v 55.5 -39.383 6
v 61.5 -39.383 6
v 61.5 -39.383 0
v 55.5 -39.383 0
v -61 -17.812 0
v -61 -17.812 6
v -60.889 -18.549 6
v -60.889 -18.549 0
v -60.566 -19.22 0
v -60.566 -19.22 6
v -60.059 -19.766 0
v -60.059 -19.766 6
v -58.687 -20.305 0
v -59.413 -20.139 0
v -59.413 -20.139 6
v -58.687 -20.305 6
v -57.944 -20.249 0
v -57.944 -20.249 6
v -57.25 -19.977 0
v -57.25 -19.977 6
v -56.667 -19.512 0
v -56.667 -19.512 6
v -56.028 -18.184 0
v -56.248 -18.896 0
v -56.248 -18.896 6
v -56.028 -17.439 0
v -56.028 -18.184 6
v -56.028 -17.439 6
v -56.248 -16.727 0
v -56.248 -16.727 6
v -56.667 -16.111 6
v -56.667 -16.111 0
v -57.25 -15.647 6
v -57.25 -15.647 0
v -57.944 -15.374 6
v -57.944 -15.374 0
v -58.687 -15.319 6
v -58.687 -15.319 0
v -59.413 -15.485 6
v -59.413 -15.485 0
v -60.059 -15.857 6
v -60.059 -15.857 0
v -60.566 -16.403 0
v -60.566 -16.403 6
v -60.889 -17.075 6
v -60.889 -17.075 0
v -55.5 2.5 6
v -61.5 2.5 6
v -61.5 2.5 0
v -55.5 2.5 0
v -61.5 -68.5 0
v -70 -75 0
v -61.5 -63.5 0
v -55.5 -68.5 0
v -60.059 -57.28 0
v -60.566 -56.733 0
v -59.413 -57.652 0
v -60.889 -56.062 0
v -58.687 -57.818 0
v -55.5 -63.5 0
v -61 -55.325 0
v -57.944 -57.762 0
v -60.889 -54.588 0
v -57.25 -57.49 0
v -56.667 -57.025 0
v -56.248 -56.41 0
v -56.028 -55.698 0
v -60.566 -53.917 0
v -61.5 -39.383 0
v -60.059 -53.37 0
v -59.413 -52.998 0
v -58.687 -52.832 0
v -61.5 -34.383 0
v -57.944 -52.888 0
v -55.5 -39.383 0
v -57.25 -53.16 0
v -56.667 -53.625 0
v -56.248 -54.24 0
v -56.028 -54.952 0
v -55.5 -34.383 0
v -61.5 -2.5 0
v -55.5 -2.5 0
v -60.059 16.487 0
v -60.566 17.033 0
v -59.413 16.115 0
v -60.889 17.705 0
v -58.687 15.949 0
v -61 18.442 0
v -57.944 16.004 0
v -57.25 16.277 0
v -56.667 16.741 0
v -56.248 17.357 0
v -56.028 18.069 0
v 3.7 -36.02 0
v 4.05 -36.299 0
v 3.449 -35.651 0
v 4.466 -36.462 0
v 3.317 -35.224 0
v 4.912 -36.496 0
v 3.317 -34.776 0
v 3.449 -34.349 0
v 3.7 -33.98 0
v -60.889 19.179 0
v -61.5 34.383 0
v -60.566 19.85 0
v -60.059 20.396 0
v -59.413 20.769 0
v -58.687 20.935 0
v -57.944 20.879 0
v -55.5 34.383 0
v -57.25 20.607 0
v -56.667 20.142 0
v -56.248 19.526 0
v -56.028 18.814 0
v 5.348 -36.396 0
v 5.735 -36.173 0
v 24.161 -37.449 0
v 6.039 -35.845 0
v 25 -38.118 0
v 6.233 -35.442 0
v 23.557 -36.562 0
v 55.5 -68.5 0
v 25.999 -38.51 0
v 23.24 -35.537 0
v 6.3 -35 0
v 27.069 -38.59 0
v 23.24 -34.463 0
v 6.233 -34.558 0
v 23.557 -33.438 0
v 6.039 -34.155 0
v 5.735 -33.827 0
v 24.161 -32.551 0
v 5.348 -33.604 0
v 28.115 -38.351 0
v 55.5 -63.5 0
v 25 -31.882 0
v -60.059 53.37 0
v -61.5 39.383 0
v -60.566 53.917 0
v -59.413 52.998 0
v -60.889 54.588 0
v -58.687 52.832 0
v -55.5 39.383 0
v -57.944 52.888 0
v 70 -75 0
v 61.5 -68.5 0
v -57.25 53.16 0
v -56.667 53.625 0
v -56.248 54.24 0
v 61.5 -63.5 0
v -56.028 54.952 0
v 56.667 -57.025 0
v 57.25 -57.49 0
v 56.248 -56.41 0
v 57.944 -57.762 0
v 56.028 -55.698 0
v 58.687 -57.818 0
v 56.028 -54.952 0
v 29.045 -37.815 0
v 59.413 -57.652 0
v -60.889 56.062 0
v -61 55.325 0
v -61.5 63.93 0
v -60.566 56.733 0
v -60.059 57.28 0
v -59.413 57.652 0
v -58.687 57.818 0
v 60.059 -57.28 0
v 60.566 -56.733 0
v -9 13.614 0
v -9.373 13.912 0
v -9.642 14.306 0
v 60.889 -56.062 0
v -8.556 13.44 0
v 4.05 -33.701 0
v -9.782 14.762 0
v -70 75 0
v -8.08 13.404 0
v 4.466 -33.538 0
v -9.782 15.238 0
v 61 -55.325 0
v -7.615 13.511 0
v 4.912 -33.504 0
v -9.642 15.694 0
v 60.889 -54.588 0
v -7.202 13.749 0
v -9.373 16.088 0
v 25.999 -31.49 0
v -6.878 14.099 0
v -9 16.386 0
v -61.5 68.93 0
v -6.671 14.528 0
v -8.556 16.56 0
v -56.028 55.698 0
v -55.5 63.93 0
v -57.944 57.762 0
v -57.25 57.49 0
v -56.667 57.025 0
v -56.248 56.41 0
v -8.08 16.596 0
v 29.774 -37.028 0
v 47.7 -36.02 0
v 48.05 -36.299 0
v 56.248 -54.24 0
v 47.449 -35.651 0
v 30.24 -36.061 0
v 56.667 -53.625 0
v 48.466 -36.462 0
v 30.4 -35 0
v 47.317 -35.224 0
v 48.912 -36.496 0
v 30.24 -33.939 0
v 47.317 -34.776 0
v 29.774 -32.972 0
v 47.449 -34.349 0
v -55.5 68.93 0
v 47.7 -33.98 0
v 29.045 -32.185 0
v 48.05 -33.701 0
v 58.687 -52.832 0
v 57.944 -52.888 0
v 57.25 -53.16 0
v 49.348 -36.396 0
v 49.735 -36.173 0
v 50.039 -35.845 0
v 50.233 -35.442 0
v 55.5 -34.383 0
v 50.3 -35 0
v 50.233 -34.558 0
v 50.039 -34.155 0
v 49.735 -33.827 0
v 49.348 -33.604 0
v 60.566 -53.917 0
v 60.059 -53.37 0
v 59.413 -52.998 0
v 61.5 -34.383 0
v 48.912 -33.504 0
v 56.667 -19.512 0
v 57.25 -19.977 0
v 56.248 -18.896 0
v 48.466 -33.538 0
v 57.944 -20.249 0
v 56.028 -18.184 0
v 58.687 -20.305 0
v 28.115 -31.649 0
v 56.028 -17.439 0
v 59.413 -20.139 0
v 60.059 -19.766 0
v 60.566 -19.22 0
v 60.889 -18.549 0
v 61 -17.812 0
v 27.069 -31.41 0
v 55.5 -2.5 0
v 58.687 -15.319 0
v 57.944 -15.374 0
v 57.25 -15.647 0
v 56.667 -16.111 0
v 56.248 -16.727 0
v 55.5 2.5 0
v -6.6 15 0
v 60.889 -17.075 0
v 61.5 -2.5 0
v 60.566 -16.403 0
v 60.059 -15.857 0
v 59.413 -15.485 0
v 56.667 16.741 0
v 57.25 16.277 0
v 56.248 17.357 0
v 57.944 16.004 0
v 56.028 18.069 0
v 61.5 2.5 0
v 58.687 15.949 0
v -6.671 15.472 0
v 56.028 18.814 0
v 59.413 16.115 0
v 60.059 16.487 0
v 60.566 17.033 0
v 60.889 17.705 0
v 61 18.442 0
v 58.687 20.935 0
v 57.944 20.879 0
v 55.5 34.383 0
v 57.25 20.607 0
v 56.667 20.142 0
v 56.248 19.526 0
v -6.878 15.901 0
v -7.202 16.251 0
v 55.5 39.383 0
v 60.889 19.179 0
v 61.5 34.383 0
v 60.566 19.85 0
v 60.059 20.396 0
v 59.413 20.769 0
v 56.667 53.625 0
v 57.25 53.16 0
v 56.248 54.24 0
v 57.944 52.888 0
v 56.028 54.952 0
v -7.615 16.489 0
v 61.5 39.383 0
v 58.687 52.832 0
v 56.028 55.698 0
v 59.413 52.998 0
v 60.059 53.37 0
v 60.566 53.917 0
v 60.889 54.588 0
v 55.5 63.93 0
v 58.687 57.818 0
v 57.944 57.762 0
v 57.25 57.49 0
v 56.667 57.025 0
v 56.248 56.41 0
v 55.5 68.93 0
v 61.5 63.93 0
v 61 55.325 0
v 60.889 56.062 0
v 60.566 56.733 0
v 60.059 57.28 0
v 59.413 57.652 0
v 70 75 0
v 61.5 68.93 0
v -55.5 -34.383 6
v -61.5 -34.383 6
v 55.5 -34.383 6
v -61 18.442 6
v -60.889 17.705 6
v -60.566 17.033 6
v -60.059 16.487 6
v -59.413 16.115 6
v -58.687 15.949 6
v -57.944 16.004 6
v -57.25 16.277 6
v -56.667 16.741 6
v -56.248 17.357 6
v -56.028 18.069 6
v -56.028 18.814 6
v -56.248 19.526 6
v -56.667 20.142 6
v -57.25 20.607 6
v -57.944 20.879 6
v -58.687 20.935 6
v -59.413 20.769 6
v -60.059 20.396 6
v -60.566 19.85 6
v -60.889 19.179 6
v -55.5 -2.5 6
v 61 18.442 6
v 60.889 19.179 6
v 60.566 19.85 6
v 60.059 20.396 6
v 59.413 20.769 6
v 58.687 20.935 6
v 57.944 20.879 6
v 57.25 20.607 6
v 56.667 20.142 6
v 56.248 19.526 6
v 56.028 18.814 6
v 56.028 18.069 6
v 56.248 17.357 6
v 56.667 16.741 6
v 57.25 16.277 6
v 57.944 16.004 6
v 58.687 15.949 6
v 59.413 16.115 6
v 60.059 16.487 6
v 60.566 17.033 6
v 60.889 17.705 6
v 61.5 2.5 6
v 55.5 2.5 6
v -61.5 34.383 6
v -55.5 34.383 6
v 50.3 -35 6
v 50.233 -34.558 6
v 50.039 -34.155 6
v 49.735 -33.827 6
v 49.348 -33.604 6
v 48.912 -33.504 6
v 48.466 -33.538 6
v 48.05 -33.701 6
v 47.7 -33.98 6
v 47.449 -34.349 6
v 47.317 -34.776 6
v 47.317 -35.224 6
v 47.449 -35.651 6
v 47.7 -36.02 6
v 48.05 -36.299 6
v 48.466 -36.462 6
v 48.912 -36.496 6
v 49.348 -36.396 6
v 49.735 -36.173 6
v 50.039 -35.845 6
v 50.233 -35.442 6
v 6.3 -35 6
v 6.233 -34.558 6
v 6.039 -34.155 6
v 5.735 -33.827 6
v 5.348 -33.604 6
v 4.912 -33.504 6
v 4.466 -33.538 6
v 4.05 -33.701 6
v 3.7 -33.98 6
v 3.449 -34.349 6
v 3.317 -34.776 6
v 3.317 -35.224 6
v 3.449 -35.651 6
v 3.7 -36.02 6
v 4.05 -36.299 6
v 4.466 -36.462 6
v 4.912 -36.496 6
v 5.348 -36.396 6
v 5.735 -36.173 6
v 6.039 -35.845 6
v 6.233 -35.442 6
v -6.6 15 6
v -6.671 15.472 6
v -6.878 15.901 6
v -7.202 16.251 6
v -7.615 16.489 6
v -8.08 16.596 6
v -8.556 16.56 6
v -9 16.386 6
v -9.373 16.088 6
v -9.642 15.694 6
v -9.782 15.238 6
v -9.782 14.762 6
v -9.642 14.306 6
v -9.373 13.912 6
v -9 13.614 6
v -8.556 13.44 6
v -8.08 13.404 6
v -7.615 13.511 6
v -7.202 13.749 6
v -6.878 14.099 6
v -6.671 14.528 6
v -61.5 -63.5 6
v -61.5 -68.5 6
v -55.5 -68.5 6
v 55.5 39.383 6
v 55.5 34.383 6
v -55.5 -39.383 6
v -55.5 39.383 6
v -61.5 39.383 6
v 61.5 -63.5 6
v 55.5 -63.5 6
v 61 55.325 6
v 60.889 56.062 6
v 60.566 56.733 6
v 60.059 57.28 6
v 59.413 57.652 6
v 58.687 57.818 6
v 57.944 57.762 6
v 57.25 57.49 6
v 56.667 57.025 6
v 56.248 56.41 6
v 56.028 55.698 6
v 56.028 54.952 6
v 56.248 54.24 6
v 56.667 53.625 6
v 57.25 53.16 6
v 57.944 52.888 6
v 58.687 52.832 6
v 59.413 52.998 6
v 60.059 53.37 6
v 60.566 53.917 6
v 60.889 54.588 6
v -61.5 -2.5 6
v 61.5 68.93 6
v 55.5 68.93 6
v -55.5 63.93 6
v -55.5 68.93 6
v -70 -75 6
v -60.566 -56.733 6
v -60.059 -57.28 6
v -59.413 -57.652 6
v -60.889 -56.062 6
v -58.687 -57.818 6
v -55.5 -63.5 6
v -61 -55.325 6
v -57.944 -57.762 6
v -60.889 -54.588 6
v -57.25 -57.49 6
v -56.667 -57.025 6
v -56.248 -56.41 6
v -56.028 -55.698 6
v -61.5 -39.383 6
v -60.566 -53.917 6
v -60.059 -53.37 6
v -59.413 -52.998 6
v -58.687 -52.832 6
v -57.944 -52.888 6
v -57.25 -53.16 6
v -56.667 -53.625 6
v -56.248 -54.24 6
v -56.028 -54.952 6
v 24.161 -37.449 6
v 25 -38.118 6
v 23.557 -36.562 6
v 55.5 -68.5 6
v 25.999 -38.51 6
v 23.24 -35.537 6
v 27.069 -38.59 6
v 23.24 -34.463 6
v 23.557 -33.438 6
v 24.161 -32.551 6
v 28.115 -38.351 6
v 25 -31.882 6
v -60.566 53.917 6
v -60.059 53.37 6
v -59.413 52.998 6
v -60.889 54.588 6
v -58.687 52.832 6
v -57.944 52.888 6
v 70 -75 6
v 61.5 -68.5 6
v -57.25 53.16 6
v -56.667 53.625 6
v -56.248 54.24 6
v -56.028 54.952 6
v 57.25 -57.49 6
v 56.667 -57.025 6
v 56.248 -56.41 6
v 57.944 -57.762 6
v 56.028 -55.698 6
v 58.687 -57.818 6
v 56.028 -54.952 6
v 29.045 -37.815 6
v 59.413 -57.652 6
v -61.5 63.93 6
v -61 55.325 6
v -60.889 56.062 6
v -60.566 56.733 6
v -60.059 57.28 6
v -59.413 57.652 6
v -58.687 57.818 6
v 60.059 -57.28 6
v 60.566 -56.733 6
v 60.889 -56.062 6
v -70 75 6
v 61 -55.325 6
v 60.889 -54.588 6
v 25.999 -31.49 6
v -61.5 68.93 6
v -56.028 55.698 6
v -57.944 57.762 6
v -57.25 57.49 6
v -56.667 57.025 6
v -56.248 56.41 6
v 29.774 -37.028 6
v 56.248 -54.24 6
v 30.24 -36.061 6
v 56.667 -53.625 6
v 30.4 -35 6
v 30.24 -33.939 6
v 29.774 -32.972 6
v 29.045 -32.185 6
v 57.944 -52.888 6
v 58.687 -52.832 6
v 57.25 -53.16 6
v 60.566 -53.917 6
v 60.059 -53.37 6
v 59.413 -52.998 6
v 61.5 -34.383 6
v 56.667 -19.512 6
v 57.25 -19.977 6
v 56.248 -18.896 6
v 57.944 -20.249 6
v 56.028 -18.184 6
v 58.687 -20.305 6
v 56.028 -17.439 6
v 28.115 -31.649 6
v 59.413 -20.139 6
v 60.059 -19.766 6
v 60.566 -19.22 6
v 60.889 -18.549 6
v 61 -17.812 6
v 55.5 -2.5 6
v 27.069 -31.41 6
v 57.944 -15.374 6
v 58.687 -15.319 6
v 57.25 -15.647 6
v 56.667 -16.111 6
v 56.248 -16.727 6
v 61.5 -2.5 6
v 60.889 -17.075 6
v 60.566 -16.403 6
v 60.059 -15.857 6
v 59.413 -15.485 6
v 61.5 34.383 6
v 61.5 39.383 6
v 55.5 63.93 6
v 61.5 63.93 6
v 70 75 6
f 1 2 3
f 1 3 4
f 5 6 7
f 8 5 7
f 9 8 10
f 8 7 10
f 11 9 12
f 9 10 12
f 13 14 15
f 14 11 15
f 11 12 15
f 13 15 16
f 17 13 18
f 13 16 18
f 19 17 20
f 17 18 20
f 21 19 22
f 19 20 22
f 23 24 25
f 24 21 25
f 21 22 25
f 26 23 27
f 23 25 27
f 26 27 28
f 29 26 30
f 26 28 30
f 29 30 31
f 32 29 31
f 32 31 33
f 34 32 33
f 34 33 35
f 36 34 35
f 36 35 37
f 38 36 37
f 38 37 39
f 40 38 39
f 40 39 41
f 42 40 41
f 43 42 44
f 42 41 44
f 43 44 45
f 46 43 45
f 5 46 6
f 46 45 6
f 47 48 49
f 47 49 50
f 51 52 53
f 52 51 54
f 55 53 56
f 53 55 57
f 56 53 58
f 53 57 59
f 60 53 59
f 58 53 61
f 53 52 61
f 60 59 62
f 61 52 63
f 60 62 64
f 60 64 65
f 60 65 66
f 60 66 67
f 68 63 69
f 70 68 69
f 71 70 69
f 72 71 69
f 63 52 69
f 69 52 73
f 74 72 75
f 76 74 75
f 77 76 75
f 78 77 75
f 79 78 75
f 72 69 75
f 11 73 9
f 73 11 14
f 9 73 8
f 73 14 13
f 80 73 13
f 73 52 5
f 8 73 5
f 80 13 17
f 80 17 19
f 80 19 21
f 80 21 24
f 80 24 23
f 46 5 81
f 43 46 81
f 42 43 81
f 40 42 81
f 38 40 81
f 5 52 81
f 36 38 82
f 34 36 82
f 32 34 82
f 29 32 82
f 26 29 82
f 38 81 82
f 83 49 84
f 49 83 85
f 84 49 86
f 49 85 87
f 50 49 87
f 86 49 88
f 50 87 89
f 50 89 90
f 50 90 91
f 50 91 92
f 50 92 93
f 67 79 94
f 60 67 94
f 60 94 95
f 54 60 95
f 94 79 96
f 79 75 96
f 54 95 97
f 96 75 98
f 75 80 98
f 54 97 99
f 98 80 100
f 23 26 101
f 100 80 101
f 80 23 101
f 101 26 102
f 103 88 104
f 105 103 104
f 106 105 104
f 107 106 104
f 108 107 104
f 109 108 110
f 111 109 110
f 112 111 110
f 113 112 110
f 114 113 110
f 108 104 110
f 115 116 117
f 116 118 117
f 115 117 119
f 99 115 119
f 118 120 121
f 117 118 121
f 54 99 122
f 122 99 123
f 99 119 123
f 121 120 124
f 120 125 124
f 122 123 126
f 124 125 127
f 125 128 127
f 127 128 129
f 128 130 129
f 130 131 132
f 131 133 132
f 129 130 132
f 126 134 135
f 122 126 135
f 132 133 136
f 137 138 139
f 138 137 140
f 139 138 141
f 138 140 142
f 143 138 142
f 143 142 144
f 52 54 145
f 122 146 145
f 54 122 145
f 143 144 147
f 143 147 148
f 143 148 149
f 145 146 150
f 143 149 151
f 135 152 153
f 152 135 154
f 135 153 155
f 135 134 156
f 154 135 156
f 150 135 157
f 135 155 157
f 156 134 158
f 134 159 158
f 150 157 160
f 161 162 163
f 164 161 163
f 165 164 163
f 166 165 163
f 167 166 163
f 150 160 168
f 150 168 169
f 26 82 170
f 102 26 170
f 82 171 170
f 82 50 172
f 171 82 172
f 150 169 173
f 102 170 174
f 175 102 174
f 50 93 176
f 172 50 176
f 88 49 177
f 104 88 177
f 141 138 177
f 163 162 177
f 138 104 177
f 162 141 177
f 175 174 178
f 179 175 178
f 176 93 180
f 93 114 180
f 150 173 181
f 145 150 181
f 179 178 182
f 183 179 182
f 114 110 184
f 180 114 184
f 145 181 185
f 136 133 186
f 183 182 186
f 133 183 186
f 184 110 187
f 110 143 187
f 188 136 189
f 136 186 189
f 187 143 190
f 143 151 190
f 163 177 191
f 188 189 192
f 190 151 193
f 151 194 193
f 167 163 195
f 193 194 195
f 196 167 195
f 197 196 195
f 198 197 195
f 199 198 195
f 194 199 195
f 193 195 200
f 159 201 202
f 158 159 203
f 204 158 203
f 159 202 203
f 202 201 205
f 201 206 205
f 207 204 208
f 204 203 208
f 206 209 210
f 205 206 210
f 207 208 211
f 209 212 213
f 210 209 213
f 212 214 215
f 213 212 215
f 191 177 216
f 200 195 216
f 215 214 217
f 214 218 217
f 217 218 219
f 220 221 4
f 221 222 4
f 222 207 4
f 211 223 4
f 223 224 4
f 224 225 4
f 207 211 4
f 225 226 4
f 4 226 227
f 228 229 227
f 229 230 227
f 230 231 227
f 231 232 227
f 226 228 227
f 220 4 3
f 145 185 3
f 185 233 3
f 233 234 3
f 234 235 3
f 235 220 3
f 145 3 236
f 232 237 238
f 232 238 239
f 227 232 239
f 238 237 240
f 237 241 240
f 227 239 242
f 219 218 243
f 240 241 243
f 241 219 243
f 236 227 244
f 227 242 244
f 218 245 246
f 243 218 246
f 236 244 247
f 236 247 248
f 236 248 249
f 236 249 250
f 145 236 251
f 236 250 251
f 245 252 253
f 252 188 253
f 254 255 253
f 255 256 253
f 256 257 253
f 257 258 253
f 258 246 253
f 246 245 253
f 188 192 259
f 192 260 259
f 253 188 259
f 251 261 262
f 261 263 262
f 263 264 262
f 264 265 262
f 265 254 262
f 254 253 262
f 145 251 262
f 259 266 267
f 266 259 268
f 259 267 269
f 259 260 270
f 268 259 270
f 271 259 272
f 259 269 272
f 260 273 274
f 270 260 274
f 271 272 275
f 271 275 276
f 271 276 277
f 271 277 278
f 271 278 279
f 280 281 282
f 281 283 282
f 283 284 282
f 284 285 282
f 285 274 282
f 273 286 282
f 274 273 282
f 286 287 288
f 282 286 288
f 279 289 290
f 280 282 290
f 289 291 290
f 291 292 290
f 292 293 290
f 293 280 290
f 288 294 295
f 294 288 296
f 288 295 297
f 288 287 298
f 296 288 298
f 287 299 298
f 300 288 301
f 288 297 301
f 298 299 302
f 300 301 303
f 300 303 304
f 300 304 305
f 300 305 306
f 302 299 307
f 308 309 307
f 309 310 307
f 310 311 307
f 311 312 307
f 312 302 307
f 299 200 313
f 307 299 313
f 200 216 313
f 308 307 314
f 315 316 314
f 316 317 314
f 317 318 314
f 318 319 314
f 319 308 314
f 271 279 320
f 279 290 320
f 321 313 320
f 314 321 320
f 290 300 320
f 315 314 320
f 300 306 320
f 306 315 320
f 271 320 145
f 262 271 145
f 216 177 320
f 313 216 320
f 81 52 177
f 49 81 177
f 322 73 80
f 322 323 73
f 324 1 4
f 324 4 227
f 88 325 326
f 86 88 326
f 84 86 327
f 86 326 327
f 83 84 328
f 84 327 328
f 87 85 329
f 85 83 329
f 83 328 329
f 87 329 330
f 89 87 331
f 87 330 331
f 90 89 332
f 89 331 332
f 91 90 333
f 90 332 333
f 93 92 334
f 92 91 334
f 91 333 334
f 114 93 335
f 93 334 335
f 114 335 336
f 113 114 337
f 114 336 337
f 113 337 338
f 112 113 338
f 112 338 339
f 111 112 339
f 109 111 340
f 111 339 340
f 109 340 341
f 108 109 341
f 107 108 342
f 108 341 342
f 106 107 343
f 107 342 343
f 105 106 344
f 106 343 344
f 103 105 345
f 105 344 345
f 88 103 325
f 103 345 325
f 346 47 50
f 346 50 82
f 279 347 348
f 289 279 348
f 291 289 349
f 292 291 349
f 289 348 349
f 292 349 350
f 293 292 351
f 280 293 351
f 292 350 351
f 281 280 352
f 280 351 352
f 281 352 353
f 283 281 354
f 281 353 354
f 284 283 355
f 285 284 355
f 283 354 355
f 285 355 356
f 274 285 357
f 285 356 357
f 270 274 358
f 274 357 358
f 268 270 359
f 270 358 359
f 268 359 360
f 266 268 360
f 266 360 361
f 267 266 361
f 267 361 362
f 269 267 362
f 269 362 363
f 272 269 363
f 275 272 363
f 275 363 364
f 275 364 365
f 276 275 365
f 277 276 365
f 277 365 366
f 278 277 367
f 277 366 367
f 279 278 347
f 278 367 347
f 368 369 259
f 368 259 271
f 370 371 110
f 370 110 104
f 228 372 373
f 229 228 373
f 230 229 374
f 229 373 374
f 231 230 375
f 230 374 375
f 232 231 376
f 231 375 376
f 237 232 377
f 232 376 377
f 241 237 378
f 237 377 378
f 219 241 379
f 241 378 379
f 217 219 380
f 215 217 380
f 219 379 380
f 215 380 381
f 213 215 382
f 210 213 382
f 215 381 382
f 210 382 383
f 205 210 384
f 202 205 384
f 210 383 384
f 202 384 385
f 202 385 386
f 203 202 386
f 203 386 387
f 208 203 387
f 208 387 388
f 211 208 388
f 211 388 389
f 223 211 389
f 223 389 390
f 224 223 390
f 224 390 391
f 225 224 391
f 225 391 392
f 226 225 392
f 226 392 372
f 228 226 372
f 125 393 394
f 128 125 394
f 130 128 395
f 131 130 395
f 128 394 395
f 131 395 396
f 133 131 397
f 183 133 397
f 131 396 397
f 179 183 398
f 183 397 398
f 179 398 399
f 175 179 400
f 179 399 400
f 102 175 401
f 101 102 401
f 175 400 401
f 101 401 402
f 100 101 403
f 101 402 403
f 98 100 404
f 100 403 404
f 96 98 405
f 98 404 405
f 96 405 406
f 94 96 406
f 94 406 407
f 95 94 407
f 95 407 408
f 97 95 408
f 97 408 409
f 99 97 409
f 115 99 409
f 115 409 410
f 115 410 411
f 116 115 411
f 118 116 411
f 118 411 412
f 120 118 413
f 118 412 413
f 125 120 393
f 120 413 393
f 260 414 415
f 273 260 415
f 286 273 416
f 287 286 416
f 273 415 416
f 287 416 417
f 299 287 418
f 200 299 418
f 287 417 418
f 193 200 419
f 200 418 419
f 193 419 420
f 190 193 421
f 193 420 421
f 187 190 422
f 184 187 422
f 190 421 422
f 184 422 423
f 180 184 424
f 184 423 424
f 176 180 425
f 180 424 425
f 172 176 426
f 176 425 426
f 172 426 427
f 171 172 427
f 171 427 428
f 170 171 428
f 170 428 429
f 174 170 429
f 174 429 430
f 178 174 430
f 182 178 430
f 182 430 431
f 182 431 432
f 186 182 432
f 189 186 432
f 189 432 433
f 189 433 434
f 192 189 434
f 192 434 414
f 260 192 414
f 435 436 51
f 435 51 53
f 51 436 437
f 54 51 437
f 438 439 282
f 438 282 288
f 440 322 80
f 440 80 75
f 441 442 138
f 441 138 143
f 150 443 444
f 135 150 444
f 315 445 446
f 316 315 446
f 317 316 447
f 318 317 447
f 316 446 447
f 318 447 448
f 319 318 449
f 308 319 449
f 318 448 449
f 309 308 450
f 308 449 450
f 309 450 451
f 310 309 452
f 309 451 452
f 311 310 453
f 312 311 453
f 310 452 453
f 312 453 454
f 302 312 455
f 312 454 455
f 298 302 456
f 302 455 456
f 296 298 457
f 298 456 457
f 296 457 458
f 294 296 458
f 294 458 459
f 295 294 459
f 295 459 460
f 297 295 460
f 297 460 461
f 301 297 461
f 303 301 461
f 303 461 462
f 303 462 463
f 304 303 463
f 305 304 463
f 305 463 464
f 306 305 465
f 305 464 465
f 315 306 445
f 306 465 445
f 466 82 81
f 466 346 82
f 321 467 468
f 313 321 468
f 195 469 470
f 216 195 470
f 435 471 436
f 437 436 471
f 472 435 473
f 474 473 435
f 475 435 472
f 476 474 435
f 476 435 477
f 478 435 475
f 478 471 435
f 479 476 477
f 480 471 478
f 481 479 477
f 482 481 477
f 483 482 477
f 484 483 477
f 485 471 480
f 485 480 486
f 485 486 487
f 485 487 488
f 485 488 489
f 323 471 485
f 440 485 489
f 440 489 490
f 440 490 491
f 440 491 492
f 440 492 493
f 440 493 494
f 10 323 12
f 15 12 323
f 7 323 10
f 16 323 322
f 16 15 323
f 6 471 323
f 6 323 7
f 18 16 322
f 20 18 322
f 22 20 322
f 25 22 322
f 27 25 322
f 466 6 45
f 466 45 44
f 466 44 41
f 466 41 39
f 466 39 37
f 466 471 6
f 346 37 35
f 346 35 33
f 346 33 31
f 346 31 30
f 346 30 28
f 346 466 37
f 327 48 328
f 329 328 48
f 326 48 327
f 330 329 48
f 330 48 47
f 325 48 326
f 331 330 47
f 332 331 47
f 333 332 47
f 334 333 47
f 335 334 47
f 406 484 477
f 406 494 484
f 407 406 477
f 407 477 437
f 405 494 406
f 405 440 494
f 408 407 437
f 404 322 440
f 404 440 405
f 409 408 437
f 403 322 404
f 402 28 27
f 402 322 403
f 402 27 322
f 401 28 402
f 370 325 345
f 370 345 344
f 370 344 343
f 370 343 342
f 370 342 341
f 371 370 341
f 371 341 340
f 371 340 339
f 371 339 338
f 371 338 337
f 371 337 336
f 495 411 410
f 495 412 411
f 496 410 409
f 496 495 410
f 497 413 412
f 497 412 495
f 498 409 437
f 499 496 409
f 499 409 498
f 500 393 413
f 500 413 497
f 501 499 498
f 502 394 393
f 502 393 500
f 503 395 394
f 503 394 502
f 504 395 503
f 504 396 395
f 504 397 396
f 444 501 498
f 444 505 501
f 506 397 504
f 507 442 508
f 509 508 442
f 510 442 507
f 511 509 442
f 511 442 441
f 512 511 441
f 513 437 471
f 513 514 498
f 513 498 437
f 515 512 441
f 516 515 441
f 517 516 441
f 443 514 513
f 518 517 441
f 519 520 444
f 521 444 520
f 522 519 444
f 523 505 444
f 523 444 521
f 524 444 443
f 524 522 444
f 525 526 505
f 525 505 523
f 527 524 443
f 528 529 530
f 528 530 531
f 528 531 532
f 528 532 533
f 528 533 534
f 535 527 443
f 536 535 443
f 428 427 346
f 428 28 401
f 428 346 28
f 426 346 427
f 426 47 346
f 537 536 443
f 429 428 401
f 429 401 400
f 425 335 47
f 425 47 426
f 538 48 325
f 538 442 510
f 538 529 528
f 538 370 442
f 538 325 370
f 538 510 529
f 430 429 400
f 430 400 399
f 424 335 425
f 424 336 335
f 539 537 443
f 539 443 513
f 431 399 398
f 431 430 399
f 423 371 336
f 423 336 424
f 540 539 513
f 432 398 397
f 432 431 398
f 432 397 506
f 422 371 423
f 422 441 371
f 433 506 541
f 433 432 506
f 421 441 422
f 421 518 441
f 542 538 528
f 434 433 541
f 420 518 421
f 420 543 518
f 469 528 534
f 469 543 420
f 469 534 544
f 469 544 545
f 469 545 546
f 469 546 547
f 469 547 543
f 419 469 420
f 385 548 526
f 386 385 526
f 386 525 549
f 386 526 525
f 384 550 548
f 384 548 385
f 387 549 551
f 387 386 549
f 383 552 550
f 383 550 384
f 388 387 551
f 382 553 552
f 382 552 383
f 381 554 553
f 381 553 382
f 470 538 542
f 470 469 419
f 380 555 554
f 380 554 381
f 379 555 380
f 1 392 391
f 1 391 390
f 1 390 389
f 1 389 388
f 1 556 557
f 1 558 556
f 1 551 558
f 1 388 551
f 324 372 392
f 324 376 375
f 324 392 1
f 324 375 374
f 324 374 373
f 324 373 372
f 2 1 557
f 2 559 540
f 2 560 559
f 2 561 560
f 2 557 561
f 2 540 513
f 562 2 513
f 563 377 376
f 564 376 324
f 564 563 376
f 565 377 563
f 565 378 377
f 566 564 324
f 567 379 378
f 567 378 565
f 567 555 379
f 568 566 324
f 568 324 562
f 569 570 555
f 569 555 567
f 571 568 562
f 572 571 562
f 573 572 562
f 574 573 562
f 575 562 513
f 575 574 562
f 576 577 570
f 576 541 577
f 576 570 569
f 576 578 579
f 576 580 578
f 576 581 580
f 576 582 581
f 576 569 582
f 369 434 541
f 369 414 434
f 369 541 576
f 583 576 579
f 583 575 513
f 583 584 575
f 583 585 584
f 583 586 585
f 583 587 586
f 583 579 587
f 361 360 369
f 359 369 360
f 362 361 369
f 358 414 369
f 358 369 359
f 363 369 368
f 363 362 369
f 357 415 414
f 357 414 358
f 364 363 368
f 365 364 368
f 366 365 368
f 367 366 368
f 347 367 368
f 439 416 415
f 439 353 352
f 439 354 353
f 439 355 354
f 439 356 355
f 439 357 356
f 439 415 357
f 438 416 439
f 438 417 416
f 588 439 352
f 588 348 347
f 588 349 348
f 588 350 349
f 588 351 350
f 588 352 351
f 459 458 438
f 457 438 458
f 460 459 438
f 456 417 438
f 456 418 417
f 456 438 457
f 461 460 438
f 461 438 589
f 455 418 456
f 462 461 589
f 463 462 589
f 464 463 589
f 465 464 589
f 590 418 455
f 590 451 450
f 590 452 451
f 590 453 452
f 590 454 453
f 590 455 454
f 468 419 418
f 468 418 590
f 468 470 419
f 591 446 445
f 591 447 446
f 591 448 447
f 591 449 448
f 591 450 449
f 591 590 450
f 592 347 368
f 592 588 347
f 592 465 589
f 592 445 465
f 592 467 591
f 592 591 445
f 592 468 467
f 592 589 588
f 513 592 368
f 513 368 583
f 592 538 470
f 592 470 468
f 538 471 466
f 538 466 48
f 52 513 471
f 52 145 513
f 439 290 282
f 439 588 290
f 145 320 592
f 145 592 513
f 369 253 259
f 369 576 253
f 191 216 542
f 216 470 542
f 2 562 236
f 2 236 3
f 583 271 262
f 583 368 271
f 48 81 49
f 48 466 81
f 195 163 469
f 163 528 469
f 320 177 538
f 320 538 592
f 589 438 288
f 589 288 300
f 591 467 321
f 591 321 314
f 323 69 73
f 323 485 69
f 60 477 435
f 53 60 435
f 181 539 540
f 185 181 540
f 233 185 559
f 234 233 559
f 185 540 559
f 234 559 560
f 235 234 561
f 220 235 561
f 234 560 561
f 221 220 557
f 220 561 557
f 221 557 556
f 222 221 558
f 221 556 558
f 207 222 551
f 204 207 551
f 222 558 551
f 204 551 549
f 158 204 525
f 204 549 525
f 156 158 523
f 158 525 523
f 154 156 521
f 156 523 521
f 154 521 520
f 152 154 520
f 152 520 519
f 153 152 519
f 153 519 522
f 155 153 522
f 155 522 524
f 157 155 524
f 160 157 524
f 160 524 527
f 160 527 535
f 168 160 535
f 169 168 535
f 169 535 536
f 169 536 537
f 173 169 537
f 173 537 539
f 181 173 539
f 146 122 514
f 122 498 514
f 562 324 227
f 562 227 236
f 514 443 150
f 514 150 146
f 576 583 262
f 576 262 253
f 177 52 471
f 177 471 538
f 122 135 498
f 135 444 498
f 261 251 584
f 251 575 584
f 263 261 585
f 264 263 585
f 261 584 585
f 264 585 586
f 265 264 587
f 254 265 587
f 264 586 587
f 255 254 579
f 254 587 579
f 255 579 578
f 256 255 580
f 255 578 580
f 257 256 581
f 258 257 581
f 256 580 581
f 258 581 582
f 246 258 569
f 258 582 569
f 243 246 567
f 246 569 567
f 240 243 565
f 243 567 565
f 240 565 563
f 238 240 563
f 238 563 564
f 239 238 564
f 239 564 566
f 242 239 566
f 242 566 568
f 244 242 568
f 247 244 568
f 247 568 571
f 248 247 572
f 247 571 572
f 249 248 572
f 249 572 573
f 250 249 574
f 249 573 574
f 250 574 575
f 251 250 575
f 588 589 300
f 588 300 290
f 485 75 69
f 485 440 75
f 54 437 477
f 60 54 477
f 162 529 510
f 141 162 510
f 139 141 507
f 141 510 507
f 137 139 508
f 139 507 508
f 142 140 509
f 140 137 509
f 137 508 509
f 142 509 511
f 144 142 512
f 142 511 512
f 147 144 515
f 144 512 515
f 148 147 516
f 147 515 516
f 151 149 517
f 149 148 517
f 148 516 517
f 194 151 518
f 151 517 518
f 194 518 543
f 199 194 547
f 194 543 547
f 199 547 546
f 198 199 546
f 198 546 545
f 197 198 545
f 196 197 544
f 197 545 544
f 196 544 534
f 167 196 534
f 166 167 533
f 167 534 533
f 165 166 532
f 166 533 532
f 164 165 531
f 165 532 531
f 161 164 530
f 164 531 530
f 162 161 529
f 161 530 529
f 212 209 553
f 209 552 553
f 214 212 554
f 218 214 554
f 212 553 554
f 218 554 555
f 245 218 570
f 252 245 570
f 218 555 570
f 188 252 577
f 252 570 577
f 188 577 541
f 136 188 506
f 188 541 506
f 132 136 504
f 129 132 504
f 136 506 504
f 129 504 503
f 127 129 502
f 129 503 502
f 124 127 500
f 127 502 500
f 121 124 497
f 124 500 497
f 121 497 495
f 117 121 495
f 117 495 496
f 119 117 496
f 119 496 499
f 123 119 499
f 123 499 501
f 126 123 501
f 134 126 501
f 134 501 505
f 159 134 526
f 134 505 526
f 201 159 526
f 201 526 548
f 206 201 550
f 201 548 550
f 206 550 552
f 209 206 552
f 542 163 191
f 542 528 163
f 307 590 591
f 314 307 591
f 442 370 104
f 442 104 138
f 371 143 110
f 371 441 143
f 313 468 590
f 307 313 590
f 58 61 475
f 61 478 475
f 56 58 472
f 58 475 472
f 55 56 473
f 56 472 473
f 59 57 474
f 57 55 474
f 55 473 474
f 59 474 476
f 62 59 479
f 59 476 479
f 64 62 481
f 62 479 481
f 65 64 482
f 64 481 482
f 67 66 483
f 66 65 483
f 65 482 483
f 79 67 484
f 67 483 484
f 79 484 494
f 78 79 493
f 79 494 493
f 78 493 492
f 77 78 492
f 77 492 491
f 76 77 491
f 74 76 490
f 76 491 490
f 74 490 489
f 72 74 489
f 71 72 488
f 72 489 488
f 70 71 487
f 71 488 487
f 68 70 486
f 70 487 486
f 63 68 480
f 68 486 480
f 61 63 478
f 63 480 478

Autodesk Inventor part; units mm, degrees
ref_plane "YZ Plane" through (0, 0, 0) normal (1, 0, 0) x (0, 1, 0)
ref_plane "XZ Plane" through (0, 0, 0) normal (0, 1, 0) x (-1, 0, 0)
ref_plane "XY Plane" through (0, 0, 0) normal (0, 0, 1) x (1, 0, 0)
sketch "Boceto1" plane through (0, 0, 0) normal (0, 0, 1) x (1, 0, 0)
  line L0 (70, -75) -> (-70, -75)
  line L1 (-70, -75) -> (-70, 75)
  line L2 (-70, 75) -> (70, 75)
  line L3 (70, 75) -> (70, -75)
  line L4 (70, -75) -> (-70, 75) construction
  line L5 (-70, -75) -> (70, 75) construction
  point P0 (0, 0)
  dimension "d0" = 140
  dimension "d1" = 150
extrude "Extrusión1" add sketch "Boceto1" along normal blind 6
sketch "Boceto2" plane through (0, 0, 6) normal (0, 0, 1) x (1, 0, 0)
  line L0 (-70, -75) -> (70, -75) projected
  line L1 (70, -75) -> (70, 75) projected
  line L2 (70, 75) -> (-70, 75) projected
  line L3 (-70, 75) -> (-70, -75) projected
  line L4 (70, 75) -> (70, 68.9297)
  line L5 (70, 63.9297) -> (70, 57)
  line L6 (70, 53.65) -> (70, 39.3833)
  line L7 (70, 34.3833) -> (70, 20.1167)
  line L8 (70, 16.7667) -> (70, 2.5)
  line L9 (70, -2.5) -> (70, -16.7667)
  line L10 (70, -20.1167) -> (70, -34.3833)
  line L11 (70, 75) -> (70, 68.9297)
  line L12 (61.5, 68.9297) -> (61.5, 63.9297)
  line L13 (70, 63.9297) -> (70, 57)
  line L14 (70, 53.65) -> (70, 39.3833)
  line L15 (70, 34.3833) -> (70, 20.1167)
  line L16 (70, 16.7667) -> (70, 2.5)
  line L17 (61.5, 2.5) -> (61.5, -2.5)
  line L18 (70, -2.5) -> (70, -16.7667)
  line L19 (70, -20.1167) -> (70, -34.3833)
  line L20 (61.5, -34.3833) -> (61.5, -39.3833)
  line L21 (61.5, -63.5) -> (61.5, -68.5)
  line L22 (61.5, 68.9297) -> (55.5, 68.9297)
  line L23 (55.5, 68.9297) -> (55.5, 63.9297)
  line L24 (55.5, 63.9297) -> (61.5, 63.9297)
  line L25 (61.5, 63.9297) -> (61.5, 68.9297)
  line L26 (61.5, 34.3833) -> (55.5, 34.3833)
  line L27 (55.5, 34.3833) -> (55.5, 39.3833)
  line L28 (55.5, 39.3833) -> (61.5, 39.3833)
  line L29 (61.5, 39.3833) -> (61.5, 34.3833)
  line L30 (55.5, 2.5) -> (61.5, 2.5)
  line L31 (61.5, 2.5) -> (61.5, -2.5)
  line L32 (61.5, -2.5) -> (55.5, -2.5)
  line L33 (55.5, -2.5) -> (55.5, 2.5)
  line L34 (55.5, -34.3833) -> (61.5, -34.3833)
  line L35 (61.5, -34.3833) -> (61.5, -39.3833)
  line L36 (61.5, -39.3833) -> (55.5, -39.3833)
  line L37 (55.5, -39.3833) -> (55.5, -34.3833)
  line L38 (55.5, -68.5) -> (61.5, -68.5)
  line L39 (61.5, -68.5) -> (61.5, -63.5)
  line L40 (61.5, -63.5) -> (55.5, -63.5)
  line L41 (55.5, -63.5) -> (55.5, -68.5)
  dimension "d7" = 5
  dimension "d8" = 6
  dimension "d9" = 5
  dimension "d12" = 6
  dimension "d16" = 6
  dimension "d35" = 8.5
  dimension "d36" = 6
  dimension "d37" = 8.5
  dimension "d40" = 8.5
  dimension "d45" = 8.5
  dimension "d46" = 8.5
  dimension "d47" = 6
  dimension "d48" = 5
  dimension "d49" = 5
  dimension "d50" = 5
extrude "Extrusión2" cut sketch "Boceto2" against normal blind 6 contours L12 L24 L23 L22 | L17 L32 L33 L30 | L20 L36 L37 L34 | L21 L38 L41 L40 | L26 L27 L28 L29
mirror "Simetría1" about plane through (0, 0, 0) normal (1, 0, 0) of "Extrusión2"
sketch "Boceto4" plane through (0, 0, 6) normal (0, 0, 1) x (1, 0, 0)
  line L0 (70, 75) -> (70, 68.9297)
  line L1 (70, 68.9297) -> (65, 68.9297)
  line L2 (65, 68.9297) -> (65, 63.9297)
  line L3 (65, 63.9297) -> (70, 63.9297)
  line L4 (70, 63.9297) -> (70, 57)
  line L5 (70, 53.65) -> (70, 39.3833)
  line L6 (70, 39.3833) -> (65, 39.3833)
  line L7 (65, 39.3833) -> (65, 34.3833)
  line L8 (65, 34.3833) -> (70, 34.3833)
  line L9 (70, 34.3833) -> (70, 20.1167)
  line L10 (70, 16.7667) -> (70, 2.5)
  line L11 (70, 2.5) -> (65, 2.5)
  line L12 (65, 2.5) -> (65, -2.5)
  line L13 (65, -2.5) -> (70, -2.5)
  line L14 (70, -2.5) -> (70, -16.7667)
  line L15 (70, -20.1167) -> (70, -34.3833)
  line L16 (70, -34.3833) -> (65, -34.3833)
  line L17 (65, -34.3833) -> (65, -39.3833)
  line L18 (65, -39.3833) -> (70, -39.3833)
  line L19 (70, -39.3833) -> (70, -53.65)
  line L20 (70, -57) -> (70, -63.5)
  line L21 (70, 75) -> (70, 68.9297)
  line L22 (70, 68.9297) -> (65, 68.9297)
  line L23 (65, 68.9297) -> (65, 63.9297)
  line L24 (65, 63.9297) -> (70, 63.9297)
  line L25 (70, 63.9297) -> (70, 57)
  line L26 (70, 57) -> (76.2, 57)
  line L27 (76.2, 57) -> (76.2, 58.3)
  line L28 (76.2, 58.3) -> (79, 58.3)
  line L29 (79, 58.3) -> (79, 57)
  line L30 (79, 57) -> (82, 57)
  line L31 (82, 57) -> (82, 53.65)
  line L32 (82, 53.65) -> (79, 53.65)
  line L33 (79, 53.65) -> (79, 52.35)
  line L34 (79, 52.35) -> (76.2, 52.35)
  line L35 (76.2, 52.35) -> (76.2, 53.65)
  line L36 (76.2, 53.65) -> (70, 53.65)
  line L37 (70, 53.65) -> (70, 39.3833)
  line L38 (70, 39.3833) -> (65, 39.3833)
  line L39 (65, 39.3833) -> (65, 34.3833)
  line L40 (65, 34.3833) -> (70, 34.3833)
  line L41 (70, 34.3833) -> (70, 20.1167)
  line L42 (70, 20.1167) -> (76.2, 20.1167)
  line L43 (76.2, 20.1167) -> (76.2, 21.4167)
  line L44 (76.2, 21.4167) -> (79, 21.4167)
  line L45 (79, 21.4167) -> (79, 20.1167)
  line L46 (79, 20.1167) -> (82, 20.1167)
  line L47 (82, 20.1167) -> (82, 16.7667)
  line L48 (82, 16.7667) -> (79, 16.7667)
  line L49 (79, 16.7667) -> (79, 15.4667)
  line L50 (79, 15.4667) -> (76.2, 15.4667)
  line L51 (76.2, 15.4667) -> (76.2, 16.7667)
  line L52 (76.2, 16.7667) -> (70, 16.7667)
  line L53 (70, 16.7667) -> (70, 2.5)
  line L54 (70, 2.5) -> (65, 2.5)
  line L55 (65, 2.5) -> (65, -2.5)
  line L56 (65, -2.5) -> (70, -2.5)
  line L57 (70, -2.5) -> (70, -16.7667)
  line L58 (70, -16.7667) -> (76.2, -16.7667)
  line L59 (76.2, -16.7667) -> (76.2, -15.4667)
  line L60 (76.2, -15.4667) -> (79, -15.4667)
  line L61 (79, -15.4667) -> (79, -16.7667)
  line L62 (79, -16.7667) -> (82, -16.7667)
  line L63 (82, -16.7667) -> (82, -20.1167)
  line L64 (82, -20.1167) -> (79, -20.1167)
  line L65 (79, -20.1167) -> (79, -21.4167)
  line L66 (79, -21.4167) -> (76.2, -21.4167)
  line L67 (76.2, -21.4167) -> (76.2, -20.1167)
  line L68 (76.2, -20.1167) -> (70, -20.1167)
  line L69 (70, -20.1167) -> (70, -34.3833)
  line L70 (70, -34.3833) -> (65, -34.3833)
  line L71 (65, -34.3833) -> (65, -39.3833)
  line L72 (65, -39.3833) -> (70, -39.3833)
  line L73 (70, -39.3833) -> (70, -53.65)
  line L74 (70, -53.65) -> (76.2, -53.65)
  line L75 (76.2, -53.65) -> (76.2, -52.35)
  line L76 (76.2, -52.35) -> (79, -52.35)
  line L77 (79, -52.35) -> (79, -53.65)
  line L78 (79, -53.65) -> (82, -53.65)
  line L79 (82, -53.65) -> (82, -57)
  line L80 (82, -57) -> (79, -57)
  line L81 (79, -57) -> (79, -58.3)
  line L82 (79, -58.3) -> (76.2, -58.3)
  line L83 (76.2, -58.3) -> (76.2, -57)
  line L84 (76.2, -57) -> (70, -57)
  line L85 (70, -57) -> (70, -63.5)
  line L86 (70, -63.5) -> (65, -63.5)
  line L87 (65, -63.5) -> (65, -68.5)
  line L88 (65, -68.5) -> (70, -68.5)
  line L89 (70, -68.5) -> (70, -75)
  line L90 (70, 75) -> (70, -75) projected
  line L91 (-61.5, -63.5) -> (-55.5, -63.5) projected
  line L92 (-55.5, -63.5) -> (-55.5, -68.5) projected
  line L93 (-55.5, -68.5) -> (-61.5, -68.5) projected
  line L94 (-61.5, -68.5) -> (-61.5, -63.5) projected
  line L95 (-61.5, 2.5) -> (-55.5, 2.5) projected
  line L96 (-55.5, 2.5) -> (-55.5, -2.5) projected
  line L97 (-55.5, -2.5) -> (-61.5, -2.5) projected
  line L98 (-61.5, -2.5) -> (-61.5, 2.5) projected
  line L99 (-61.5, 34.3833) -> (-61.5, 39.3833) projected
  line L100 (-61.5, 39.3833) -> (-55.5, 39.3833) projected
  line L101 (-55.5, 39.3833) -> (-55.5, 34.3833) projected
  line L102 (-55.5, 34.3833) -> (-61.5, 34.3833) projected
  line L103 (-61.5, -34.3833) -> (-55.5, -34.3833) projected
  line L104 (-55.5, -34.3833) -> (-55.5, -39.3833) projected
  line L105 (-55.5, -39.3833) -> (-61.5, -39.3833) projected
  line L106 (-61.5, -39.3833) -> (-61.5, -34.3833) projected
  line L107 (-55.5, 68.9297) -> (-55.5, 63.9297) projected
  line L108 (-55.5, 63.9297) -> (-61.5, 63.9297) projected
  line L109 (-61.5, 63.9297) -> (-61.5, 68.9297) projected
  line L110 (-61.5, 68.9297) -> (-55.5, 68.9297) projected
  line L111 (55.5, -63.5) -> (61.5, -63.5) projected
  line L112 (61.5, -63.5) -> (61.5, -68.5) projected
  line L113 (61.5, -68.5) -> (55.5, -68.5) projected
  line L114 (55.5, -68.5) -> (55.5, -63.5) projected
  line L115 (55.5, 2.5) -> (61.5, 2.5) projected
  line L116 (61.5, 2.5) -> (61.5, -2.5) projected
  line L117 (61.5, -2.5) -> (55.5, -2.5) projected
  line L118 (55.5, -2.5) -> (55.5, 2.5) projected
  line L119 (61.5, 39.3833) -> (61.5, 34.3833) projected
  line L120 (61.5, 34.3833) -> (55.5, 34.3833) projected
  line L121 (55.5, 34.3833) -> (55.5, 39.3833) projected
  line L122 (55.5, 39.3833) -> (61.5, 39.3833) projected
  line L123 (55.5, -34.3833) -> (61.5, -34.3833) projected
  line L124 (61.5, -34.3833) -> (61.5, -39.3833) projected
  line L125 (61.5, -39.3833) -> (55.5, -39.3833) projected
  line L126 (55.5, -39.3833) -> (55.5, -34.3833) projected
  line L127 (55.5, 63.9297) -> (55.5, 68.9297) projected
  line L128 (55.5, 68.9297) -> (61.5, 68.9297) projected
  line L129 (61.5, 68.9297) -> (61.5, 63.9297) projected
  line L130 (61.5, 63.9297) -> (55.5, 63.9297) projected
  line L131 (-70, -75) -> (70, -75) projected
  line L132 (70, -75) -> (70, 75) projected
  line L133 (70, 75) -> (-70, 75) projected
  line L134 (-70, 75) -> (-70, -75) projected
  circle A0 centre (58.5, 55.325) radius 2.5
  circle A1 centre (58.5, 18.4417) radius 2.5
  circle A2 centre (58.5, -17.8117) radius 2.5
  circle A3 centre (58.5, -55.325) radius 2.5
  line L135 (55.5, -63.5) -> (61.5, -63.5) projected
  point P0 (58.5, -63.5)
  point P1 (58.5, -63.5)
  point P2 (58.5, -63.5)
  point P3 (58.5, 2.5)
  point P4 (58.5, 39.3833)
  dimension "d28" = 5
  dimension "d29" = 5
  dimension "d30" = 5
  dimension "d31" = 5
extrude "Extrusión4" cut sketch "Boceto4" against normal blind 6 contours A0 | A1 | A2 | A3
mirror "Simetría3" about plane through (0, 0, 0) normal (1, 0, 0) of "Extrusión4"
sketch "Boceto5" plane through (0, 0, 6) normal (0, 0, 1) x (1, 0, 0)
  circle A0 centre (-8.2, 15) radius 1.6
  line L0 (70, 75) -> (-70, 75) projected
  line L1 (-70, 75) -> (-70, -75) projected
  line L2 (-70, -75) -> (-70, 75) projected
  circle A1 centre (26.8, -35) radius 3.6
  point P0 (0, 0)
  dimension "d51" = 60
  dimension "d52" = 3.2
  dimension "d53" = 61.8
  dimension "d63" = 7.2
  dimension "d64" = 35
  dimension "d65" = 50
extrude "Extrusión5" cut sketch "Boceto5" against normal blind 6 contours A0
extrude "Extrusión7" cut sketch "Boceto5" against normal blind 6 contours A1
sketch "Boceto6" plane through (0, 0, 6) normal (0, 0, 1) x (1, 0, 0)
  circle A0 centre (26.8, -35) radius 3.6 projected
  line L0 (4.8, -35) -> (48.8, -35)
  circle A1 centre (4.8, -35) radius 1.5
  circle A2 centre (48.8, -35) radius 1.5
  point P0 (0, 0)
  dimension "d68" = 44
  dimension "d69" = 3
  dimension "d70" = 3
extrude "Extrusión8" cut sketch "Boceto6" against normal blind 6 contours A1 | A2
properties part number "Plano 2" material "Vidrio"
